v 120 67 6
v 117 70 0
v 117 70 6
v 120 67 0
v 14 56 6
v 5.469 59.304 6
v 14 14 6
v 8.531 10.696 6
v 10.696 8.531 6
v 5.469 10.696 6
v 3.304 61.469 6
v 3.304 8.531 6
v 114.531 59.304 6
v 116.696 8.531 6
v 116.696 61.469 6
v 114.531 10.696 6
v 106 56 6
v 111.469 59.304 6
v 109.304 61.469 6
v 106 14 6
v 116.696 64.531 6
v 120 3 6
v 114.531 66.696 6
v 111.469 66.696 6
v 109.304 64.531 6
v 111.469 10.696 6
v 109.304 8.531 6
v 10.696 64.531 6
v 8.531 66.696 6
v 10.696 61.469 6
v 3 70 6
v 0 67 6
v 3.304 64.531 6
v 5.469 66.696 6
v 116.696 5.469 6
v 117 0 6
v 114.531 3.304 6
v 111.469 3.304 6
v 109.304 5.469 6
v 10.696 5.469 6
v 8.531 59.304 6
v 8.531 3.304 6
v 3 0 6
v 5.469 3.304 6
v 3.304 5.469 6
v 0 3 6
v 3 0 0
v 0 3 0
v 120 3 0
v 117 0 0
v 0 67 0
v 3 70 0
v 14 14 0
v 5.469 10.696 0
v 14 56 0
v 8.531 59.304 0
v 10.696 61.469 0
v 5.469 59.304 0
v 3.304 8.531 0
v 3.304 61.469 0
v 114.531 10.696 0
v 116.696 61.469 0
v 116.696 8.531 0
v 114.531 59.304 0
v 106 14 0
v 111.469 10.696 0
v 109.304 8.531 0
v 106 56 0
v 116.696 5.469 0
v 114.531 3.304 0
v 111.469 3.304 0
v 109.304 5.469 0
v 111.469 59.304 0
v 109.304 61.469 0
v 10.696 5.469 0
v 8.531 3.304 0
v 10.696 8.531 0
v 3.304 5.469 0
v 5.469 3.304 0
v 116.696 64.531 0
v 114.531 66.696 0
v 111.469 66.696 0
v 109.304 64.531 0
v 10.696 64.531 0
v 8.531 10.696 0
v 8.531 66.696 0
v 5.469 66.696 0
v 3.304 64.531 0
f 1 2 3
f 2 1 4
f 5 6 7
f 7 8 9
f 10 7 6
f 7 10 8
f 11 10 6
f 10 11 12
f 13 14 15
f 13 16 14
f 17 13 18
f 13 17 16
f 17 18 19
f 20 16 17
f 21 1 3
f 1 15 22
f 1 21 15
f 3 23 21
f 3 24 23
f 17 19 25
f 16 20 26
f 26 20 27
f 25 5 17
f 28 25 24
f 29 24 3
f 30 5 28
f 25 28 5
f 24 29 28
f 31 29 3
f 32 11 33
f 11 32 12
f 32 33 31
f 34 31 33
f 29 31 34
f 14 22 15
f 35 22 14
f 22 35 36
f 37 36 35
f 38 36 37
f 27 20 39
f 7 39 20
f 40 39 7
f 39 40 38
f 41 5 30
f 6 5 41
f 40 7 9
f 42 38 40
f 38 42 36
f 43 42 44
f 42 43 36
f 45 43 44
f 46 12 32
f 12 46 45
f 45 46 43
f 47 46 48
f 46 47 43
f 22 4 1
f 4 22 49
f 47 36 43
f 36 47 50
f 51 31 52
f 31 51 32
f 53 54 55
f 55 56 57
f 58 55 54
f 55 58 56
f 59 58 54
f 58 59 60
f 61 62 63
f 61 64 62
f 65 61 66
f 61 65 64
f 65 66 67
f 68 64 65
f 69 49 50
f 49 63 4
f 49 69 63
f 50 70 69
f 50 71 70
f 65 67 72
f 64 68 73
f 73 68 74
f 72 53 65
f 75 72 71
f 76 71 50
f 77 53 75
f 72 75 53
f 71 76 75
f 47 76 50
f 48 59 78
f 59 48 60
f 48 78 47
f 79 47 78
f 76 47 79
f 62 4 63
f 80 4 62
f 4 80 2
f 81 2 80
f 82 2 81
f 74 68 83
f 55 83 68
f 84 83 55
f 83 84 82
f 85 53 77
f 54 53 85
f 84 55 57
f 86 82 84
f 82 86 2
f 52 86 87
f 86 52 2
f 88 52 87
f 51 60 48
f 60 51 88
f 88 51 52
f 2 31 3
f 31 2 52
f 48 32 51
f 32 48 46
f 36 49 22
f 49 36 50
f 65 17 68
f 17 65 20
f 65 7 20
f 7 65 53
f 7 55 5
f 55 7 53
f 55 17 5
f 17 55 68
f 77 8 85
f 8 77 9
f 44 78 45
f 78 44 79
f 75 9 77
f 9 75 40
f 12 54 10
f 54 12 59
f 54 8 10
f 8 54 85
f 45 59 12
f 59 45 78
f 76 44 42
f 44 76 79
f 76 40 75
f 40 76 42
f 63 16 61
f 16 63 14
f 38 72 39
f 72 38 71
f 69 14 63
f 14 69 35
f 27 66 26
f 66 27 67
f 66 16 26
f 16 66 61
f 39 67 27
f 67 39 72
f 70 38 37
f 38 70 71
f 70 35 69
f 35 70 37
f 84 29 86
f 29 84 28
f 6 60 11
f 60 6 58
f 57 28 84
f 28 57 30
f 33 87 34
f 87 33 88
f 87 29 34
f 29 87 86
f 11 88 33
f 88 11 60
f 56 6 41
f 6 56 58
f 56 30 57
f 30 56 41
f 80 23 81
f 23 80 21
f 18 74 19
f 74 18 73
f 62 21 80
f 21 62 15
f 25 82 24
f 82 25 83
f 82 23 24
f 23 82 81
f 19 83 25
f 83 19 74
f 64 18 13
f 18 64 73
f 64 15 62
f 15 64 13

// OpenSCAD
$fn = 32;

// ----------------------------------------------------------------------
// Frame plate: 120 x 70 frame, 14 mm rails
// ----------------------------------------------------------------------

// --- parameters (mm) ---
plate_l = 120;            // plate length, X
plate_w = 70;             // plate width, Y
plate_t = 6;              // plate thickness, Z (extrusion height)
corner_c = 3;             // corner chamfer
frame_bar = 14;           // frame rail width
bolt_r = 4;               // corner bolt window radius
bolt_inset = 7;           // bolt centre inset from the edges

win_l = plate_l - 2 * frame_bar;  // window length
win_w = plate_w - 2 * frame_bar;  // window width
bolt_d = 2 * bolt_r;  // corner hole diameter

profile = [[3, 0], [117, 0], [120, 3], [120, 67], [117, 70], [3, 70], [0, 67], [0, 3]];  // primary outline, 8 points, counter clockwise
void_1 = [[14, 14], [106, 14], [106, 56], [14, 56]];  // the window, 4 points
void_2 = [[10.696, 8.531], [8.531, 10.696], [5.469, 10.696], [3.304, 8.531], [3.304, 5.469], [5.469, 3.304], [8.531, 3.304], [10.696, 5.469]];  // corner bolt window, 8 points
void_3 = [[116.696, 8.531], [114.531, 10.696], [111.469, 10.696], [109.304, 8.531], [109.304, 5.469], [111.469, 3.304], [114.531, 3.304], [116.696, 5.469]];  // corner bolt window, 8 points
void_4 = [[10.696, 64.531], [8.531, 66.696], [5.469, 66.696], [3.304, 64.531], [3.304, 61.469], [5.469, 59.304], [8.531, 59.304], [10.696, 61.469]];  // corner bolt window, 8 points
void_5 = [[116.696, 64.531], [114.531, 66.696], [111.469, 66.696], [109.304, 64.531], [109.304, 61.469], [111.469, 59.304], [114.531, 59.304], [116.696, 61.469]];  // corner bolt window, 8 points

// --- the one profile operation ---
difference() {
  linear_extrude(height = plate_t) polygon(points = profile);
  translate([0, 0, -1])
    linear_extrude(height = plate_t + 2) polygon(points = void_1);
  translate([0, 0, -1])
    linear_extrude(height = plate_t + 2) polygon(points = void_2);
  translate([0, 0, -1])
    linear_extrude(height = plate_t + 2) polygon(points = void_3);
  translate([0, 0, -1])
    linear_extrude(height = plate_t + 2) polygon(points = void_4);
  translate([0, 0, -1])
    linear_extrude(height = plate_t + 2) polygon(points = void_5);
}
